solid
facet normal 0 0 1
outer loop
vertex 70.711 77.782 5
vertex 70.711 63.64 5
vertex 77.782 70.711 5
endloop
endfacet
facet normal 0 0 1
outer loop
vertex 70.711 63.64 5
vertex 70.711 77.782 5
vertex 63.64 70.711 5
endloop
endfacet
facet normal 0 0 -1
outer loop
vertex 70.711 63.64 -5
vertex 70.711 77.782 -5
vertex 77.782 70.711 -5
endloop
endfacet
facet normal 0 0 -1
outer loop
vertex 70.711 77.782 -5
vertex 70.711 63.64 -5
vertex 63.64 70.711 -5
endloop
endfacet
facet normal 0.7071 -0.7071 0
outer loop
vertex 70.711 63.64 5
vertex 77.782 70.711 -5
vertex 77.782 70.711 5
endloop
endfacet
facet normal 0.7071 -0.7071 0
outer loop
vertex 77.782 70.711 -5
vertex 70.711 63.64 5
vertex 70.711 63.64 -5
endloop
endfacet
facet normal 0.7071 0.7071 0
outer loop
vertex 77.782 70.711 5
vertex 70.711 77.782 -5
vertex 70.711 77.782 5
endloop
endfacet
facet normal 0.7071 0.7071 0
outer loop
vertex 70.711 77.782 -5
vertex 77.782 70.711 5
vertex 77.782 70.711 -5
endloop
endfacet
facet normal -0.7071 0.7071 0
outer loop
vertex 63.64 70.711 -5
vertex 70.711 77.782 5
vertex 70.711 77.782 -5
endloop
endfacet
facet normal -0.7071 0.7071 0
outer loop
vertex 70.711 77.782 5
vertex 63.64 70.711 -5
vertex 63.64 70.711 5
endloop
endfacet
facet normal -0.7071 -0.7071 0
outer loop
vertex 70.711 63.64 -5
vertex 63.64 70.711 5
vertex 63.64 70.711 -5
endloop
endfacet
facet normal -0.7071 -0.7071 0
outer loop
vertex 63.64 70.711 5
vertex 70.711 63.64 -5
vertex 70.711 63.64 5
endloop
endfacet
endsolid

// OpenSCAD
/*
rotate([10,0,0])
rotate([0,0,45])
cube(size=10, center =  true);
*/
/*
translate([0,-10/2,0])
cube(size = 10, center =  true);
*/

rotate([0,0,45])
translate([100,0,0])
cube(size = 10, center =  true);
